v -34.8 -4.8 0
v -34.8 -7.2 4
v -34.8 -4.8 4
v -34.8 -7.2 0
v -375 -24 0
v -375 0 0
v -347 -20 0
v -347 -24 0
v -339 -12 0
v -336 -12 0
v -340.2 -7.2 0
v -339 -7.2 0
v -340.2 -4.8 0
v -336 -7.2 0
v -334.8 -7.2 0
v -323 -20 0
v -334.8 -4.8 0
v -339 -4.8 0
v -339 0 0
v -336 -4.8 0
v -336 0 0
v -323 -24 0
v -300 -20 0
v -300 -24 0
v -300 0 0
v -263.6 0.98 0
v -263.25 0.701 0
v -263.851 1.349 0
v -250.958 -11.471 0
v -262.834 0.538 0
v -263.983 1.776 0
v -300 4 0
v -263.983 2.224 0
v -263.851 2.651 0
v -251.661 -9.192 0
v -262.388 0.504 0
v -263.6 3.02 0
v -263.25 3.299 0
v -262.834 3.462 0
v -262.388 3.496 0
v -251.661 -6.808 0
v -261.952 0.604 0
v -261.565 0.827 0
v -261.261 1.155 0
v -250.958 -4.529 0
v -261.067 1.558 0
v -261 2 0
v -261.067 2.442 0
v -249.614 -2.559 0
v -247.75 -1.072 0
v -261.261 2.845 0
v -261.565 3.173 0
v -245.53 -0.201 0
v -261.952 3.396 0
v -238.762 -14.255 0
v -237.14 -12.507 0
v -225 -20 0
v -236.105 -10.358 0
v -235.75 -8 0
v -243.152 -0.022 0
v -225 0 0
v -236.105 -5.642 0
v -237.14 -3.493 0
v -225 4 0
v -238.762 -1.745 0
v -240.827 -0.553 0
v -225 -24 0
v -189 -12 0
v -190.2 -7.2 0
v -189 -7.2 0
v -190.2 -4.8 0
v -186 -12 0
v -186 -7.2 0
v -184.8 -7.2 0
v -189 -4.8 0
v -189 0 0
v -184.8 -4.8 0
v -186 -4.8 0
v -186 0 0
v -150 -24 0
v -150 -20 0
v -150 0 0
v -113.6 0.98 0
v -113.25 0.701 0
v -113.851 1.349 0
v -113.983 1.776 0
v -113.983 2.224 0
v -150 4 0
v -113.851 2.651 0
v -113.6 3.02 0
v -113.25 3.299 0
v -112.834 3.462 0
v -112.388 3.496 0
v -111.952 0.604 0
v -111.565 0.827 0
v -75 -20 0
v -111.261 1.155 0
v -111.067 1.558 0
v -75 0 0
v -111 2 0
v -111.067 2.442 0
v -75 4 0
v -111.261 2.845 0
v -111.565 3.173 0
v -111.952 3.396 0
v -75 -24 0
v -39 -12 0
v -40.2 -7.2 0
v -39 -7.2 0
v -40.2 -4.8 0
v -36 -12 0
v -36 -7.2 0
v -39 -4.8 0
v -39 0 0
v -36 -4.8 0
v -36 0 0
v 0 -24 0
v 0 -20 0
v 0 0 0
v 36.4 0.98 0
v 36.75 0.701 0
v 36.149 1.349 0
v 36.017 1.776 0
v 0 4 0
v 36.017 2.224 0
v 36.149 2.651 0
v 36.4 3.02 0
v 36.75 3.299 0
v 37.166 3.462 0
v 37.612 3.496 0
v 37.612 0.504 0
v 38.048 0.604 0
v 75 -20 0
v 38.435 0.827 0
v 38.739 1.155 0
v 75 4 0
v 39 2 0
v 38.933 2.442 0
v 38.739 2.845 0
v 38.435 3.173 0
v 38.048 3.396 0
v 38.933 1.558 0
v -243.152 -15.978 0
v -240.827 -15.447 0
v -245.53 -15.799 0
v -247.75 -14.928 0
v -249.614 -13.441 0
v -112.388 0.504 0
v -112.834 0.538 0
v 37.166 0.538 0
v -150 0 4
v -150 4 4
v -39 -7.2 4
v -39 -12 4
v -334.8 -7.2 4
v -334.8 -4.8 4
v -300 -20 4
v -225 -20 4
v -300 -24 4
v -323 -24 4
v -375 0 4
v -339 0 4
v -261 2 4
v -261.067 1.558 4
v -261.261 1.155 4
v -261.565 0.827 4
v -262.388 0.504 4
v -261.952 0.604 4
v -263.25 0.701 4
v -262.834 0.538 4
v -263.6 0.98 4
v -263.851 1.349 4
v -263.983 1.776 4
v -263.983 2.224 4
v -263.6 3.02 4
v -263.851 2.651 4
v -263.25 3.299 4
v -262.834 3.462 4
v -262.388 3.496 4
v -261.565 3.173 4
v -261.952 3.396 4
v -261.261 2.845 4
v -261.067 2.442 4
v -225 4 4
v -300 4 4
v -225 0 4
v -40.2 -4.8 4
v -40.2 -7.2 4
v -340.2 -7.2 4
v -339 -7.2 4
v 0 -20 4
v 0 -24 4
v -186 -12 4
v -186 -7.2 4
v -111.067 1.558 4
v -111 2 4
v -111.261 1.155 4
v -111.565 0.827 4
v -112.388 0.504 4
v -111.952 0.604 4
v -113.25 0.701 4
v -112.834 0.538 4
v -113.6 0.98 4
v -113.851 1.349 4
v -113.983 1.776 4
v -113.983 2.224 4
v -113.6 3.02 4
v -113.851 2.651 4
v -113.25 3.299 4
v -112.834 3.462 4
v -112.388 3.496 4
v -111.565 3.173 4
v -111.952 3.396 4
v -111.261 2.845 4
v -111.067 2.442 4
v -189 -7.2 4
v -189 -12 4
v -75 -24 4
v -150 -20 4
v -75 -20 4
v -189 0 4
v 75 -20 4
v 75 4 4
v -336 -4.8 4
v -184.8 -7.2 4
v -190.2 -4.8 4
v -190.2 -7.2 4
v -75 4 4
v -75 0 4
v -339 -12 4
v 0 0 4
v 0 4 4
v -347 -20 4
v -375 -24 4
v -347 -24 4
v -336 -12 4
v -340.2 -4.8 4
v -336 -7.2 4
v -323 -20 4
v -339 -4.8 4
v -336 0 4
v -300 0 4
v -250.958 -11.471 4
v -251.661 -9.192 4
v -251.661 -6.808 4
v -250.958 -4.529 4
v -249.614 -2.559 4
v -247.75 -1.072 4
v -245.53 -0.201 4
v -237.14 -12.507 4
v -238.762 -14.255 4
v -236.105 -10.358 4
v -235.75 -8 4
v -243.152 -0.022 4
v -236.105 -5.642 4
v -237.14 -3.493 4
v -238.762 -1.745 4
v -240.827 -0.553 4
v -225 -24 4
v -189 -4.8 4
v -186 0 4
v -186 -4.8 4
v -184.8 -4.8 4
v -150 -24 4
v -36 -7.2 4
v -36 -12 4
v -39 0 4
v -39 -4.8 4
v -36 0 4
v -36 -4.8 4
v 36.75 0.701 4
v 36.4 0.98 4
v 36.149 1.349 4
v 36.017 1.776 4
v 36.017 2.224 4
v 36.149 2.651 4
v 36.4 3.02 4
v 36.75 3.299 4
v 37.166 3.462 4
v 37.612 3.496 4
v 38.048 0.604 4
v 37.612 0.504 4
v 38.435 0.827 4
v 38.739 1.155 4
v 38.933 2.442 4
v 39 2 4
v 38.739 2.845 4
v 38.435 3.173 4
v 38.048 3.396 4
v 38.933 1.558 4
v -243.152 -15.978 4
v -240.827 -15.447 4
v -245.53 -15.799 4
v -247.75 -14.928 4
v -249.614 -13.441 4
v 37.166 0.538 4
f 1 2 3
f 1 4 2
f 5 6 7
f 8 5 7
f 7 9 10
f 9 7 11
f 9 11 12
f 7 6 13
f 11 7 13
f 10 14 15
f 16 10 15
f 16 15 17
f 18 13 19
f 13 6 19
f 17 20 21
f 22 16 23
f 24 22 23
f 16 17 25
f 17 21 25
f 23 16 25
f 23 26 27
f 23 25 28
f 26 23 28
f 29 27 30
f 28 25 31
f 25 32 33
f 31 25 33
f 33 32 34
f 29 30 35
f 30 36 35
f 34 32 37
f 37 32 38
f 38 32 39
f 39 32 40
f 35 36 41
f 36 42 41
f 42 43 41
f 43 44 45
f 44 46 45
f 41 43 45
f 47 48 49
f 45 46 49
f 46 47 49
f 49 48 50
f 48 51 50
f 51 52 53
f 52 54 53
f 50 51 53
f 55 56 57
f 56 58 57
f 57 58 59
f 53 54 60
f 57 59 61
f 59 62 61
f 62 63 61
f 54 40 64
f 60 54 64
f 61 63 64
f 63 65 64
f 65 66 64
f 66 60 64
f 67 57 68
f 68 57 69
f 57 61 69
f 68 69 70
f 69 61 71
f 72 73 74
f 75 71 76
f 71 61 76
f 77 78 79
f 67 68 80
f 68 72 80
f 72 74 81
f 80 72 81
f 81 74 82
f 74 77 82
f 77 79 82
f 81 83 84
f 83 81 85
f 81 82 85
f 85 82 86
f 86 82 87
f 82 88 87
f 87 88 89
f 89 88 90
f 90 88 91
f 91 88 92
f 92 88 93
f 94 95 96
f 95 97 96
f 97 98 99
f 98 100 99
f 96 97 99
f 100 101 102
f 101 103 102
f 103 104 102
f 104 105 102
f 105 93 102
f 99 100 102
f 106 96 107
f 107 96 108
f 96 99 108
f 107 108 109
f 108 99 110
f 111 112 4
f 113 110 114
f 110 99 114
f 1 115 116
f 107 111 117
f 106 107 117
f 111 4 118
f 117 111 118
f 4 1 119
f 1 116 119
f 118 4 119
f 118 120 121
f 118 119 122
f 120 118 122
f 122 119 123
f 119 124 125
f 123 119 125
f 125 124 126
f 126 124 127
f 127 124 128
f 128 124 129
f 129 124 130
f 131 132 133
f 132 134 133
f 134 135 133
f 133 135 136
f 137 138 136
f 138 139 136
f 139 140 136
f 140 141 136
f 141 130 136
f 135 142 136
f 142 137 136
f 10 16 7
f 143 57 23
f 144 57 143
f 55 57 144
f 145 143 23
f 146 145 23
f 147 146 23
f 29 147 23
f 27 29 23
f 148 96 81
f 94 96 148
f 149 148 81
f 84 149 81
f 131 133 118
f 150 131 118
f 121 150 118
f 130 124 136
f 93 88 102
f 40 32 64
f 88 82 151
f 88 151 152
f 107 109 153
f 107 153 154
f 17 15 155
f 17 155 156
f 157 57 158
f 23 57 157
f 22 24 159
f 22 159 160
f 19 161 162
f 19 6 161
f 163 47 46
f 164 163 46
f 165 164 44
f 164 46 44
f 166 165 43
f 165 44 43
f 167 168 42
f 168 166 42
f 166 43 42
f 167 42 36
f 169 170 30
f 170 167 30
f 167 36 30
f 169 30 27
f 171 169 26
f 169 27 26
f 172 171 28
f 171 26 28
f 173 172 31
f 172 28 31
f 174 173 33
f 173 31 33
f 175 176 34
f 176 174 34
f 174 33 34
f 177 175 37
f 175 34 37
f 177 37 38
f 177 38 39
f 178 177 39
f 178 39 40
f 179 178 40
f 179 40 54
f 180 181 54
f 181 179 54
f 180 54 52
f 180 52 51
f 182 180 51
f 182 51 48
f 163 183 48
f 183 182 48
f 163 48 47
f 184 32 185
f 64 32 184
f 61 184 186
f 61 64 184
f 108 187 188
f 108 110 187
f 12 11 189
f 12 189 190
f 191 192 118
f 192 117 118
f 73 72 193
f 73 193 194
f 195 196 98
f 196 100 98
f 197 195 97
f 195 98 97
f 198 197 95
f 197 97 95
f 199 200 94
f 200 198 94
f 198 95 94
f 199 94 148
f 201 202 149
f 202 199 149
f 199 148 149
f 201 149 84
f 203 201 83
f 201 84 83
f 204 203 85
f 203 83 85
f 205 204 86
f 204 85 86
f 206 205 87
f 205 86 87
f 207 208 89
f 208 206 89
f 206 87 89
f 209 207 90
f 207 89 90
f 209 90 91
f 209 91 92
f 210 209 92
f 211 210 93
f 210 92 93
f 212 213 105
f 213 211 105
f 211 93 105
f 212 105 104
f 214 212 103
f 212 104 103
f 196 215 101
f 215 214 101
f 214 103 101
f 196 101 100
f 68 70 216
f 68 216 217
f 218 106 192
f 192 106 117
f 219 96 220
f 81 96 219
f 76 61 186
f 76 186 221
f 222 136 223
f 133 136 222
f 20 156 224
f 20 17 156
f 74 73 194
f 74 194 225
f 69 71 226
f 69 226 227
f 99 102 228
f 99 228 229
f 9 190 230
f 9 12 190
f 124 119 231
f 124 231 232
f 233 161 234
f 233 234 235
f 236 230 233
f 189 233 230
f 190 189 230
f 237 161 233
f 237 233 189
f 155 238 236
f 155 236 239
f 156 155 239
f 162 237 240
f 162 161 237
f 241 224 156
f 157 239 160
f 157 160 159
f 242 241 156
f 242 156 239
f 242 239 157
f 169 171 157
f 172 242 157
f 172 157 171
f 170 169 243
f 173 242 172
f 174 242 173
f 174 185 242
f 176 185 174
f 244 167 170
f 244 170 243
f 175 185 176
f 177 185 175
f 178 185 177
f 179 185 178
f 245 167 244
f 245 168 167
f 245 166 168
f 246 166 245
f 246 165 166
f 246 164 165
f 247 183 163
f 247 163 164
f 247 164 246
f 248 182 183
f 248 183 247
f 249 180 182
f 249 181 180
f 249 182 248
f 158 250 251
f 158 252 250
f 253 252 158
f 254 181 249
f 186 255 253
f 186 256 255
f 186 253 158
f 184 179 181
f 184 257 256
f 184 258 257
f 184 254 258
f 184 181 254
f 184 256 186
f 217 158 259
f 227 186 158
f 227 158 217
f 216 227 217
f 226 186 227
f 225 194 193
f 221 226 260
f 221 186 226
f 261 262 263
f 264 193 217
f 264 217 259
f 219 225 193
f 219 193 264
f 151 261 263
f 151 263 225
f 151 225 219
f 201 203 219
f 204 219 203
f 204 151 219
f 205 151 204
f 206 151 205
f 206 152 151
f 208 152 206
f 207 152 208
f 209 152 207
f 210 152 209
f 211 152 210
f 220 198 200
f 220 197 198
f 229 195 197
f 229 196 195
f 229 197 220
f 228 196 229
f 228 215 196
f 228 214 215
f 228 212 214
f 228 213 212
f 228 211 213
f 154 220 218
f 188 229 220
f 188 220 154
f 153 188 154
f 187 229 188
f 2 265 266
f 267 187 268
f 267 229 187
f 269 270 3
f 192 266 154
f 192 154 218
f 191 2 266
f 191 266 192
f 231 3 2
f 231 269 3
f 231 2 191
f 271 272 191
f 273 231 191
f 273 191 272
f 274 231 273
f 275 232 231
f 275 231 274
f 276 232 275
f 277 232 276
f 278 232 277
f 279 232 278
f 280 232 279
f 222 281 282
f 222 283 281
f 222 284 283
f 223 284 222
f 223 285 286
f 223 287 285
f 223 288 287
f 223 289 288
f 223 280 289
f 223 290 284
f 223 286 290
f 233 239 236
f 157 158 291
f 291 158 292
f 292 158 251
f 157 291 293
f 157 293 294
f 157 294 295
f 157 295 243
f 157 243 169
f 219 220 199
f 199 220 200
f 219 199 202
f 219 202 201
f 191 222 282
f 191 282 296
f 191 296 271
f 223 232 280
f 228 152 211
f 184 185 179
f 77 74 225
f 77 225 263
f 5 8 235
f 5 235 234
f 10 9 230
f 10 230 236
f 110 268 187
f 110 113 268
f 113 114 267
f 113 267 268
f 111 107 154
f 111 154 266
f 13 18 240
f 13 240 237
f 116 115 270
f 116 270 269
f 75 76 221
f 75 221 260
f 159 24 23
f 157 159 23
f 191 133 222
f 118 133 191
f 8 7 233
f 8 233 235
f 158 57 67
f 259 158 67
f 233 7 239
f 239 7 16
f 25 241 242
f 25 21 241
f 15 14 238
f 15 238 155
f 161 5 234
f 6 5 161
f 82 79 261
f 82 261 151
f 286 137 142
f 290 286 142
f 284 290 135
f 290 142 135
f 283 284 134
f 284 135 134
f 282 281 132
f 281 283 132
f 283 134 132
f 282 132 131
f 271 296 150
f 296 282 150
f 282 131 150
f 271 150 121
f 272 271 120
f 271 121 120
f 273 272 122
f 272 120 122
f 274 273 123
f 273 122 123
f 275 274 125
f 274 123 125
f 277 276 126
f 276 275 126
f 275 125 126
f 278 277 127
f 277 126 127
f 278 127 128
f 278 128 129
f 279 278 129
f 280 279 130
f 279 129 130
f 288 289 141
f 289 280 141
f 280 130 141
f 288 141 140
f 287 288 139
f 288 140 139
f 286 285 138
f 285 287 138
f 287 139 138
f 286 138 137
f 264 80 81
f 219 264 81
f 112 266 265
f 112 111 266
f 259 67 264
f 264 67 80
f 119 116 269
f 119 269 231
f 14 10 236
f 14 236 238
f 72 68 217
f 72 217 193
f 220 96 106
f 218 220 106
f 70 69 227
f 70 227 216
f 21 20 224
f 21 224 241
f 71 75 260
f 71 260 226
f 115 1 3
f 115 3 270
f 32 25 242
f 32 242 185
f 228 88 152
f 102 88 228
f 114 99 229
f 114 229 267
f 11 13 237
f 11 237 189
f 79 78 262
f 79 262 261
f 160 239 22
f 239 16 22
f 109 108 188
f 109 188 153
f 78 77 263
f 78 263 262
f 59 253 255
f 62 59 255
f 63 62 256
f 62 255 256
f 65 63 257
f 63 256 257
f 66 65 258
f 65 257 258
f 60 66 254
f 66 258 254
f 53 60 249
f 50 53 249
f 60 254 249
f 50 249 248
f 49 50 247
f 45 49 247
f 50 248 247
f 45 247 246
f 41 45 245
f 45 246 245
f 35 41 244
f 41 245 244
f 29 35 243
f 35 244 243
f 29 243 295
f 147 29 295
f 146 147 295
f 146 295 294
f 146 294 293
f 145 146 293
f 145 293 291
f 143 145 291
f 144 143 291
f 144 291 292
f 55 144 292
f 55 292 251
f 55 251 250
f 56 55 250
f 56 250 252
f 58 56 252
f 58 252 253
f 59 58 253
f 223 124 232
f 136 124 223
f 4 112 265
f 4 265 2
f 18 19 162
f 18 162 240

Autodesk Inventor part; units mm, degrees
ref_plane "YZ Plane" through (0, 0, 0) normal (1, 0, 0) x (0, 1, 0)
ref_plane "XZ Plane" through (0, 0, 0) normal (0, 1, 0) x (-1, 0, 0)
ref_plane "XY Plane" through (0, 0, 0) normal (0, 0, 1) x (1, 0, 0)
sketch "Sketch1" plane through (0, 0, 0) normal (0, 0, 1) x (1, 0, 0)
  line L0 (-300, -24) -> (-300, -20) projected
  line L1 (-225, -24) -> (-300, -24) construction
  line L2 (-225, -20) -> (-225, -24) projected
  line L3 (-225, -20) -> (-300, -20) projected
  line L4 (-150, -24) -> (-150, -20) projected
  line L5 (-75, -24) -> (-150, -24) construction
  line L6 (-75, -20) -> (-75, -24) projected
  line L7 (-75, -20) -> (-150, -20) projected
  circle A0 centre (-262.5, 2) radius 1.5 projected
  circle A1 centre (-112.5, 2) radius 1.5 projected
  circle A2 centre (37.5, 2) radius 1.5 projected
  line L8 (-236, -49) -> (-236, -199) construction
  line L9 (-236, -199) -> (11, -199) construction
  line L10 (11, -199) -> (11, -49) construction
  line L11 (11, -49) -> (-236, -49) construction
  circle A3 centre (43, -151.5) radius 1.5 construction
  circle A4 centre (43, -96.5) radius 1.5 construction
  circle A5 centre (-268, -96.5) radius 1.5 construction
  circle A6 centre (-268, -151.5) radius 1.5 construction
  circle A7 centre (-335, -151.5) radius 1.5 construction
  circle A8 centre (-335, -96.5) radius 1.5 construction
  line L12 (-270, -161.5) -> (-270, -196.5) construction
  line L13 (-270, -196.5) -> (-266, -196.5) construction
  line L14 (-266, -196.5) -> (-266, -161.5) construction
  line L15 (-266, -161.5) -> (-270, -161.5) construction
  line L16 (45, -51.5) -> (41, -51.5) construction
  line L17 (41, -51.5) -> (41, -86.5) construction
  line L18 (41, -86.5) -> (45, -86.5) construction
  line L19 (45, -86.5) -> (45, -51.5) construction
  line L20 (45, -141.5) -> (45, -106.5) construction
  line L21 (45, -106.5) -> (41, -106.5) construction
  line L22 (41, -106.5) -> (41, -141.5) construction
  line L23 (41, -141.5) -> (45, -141.5) construction
  line L24 (-337, -161.5) -> (-337, -196.5) construction
  line L25 (-337, -196.5) -> (-333, -196.5) construction
  line L26 (-333, -196.5) -> (-333, -161.5) construction
  line L27 (-333, -161.5) -> (-337, -161.5) construction
  line L28 (-270, -106.5) -> (-270, -141.5) construction
  line L29 (-270, -141.5) -> (-266, -141.5) construction
  line L30 (-266, -141.5) -> (-266, -106.5) construction
  line L31 (-266, -106.5) -> (-270, -106.5) construction
  line L32 (-337, -51.5) -> (-337, -86.5) construction
  line L33 (-337, -86.5) -> (-333, -86.5) construction
  line L34 (-333, -86.5) -> (-333, -51.5) construction
  line L35 (-333, -51.5) -> (-337, -51.5) construction
  line L36 (41, -161.5) -> (41, -196.5) construction
  line L37 (41, -196.5) -> (45, -196.5) construction
  line L38 (45, -196.5) -> (45, -161.5) construction
  line L39 (45, -161.5) -> (41, -161.5) construction
  line L40 (-333, -106.5) -> (-337, -106.5) construction
  line L41 (-337, -106.5) -> (-337, -141.5) construction
  line L42 (-337, -141.5) -> (-333, -141.5) construction
  line L43 (-333, -141.5) -> (-333, -106.5) construction
  line L44 (-266, -51.5) -> (-270, -51.5) construction
  line L45 (-270, -51.5) -> (-270, -86.5) construction
  line L46 (-270, -86.5) -> (-266, -86.5) construction
  line L47 (-266, -86.5) -> (-266, -51.5) construction
  circle A9 centre (-112.5, -226) radius 1.5 construction
  circle A10 centre (-262.5, -226) radius 1.5 construction
  circle A11 centre (-187.5, -22) radius 1.5 construction
  circle A12 centre (-37.5, -22) radius 1.5 construction
  circle A13 centre (-337.5, -22) radius 1.5 construction
  circle A14 centre (37.5, -226) radius 1.5 construction
  line L48 (-375, -36.5) -> (-375, 0) projected
  line L49 (-336, 0) -> (-300, 0) projected
  line L50 (-300, 0) -> (-300, 4) projected
  line L51 (-300, 4) -> (-225, 4) projected
  line L52 (-225, 4) -> (-225, 0) projected
  line L53 (-225, 0) -> (-189, 0) projected
  line L54 (-150, 0) -> (-150, 4) projected
  line L55 (-150, 4) -> (-75, 4) projected
  line L56 (-75, 4) -> (-75, 0) projected
  line L57 (-75, 0) -> (-39, 0) projected
  line L58 (0, 0) -> (0, 4) projected
  line L59 (0, 4) -> (75, 4) projected
  line L60 (75, 4) -> (75, -20) projected
  line L61 (75, -20) -> (0, -20) projected
  line L62 (0, -24) -> (0, -20) projected
  line L63 (75, -24) -> (0, -24) construction
  line L64 (75, -36.5) -> (75, -24) projected
  line L65 (79, -36.5) -> (75, -36.5) projected
  line L66 (79, -71.5) -> (79, -36.5) construction
  line L67 (75, -71.5) -> (79, -71.5) construction
  line L68 (75, -87.5) -> (75, -71.5) construction
  line L69 (70.2, -87.5) -> (75, -87.5) construction
  line L70 (70.2, -86.3) -> (70.2, -87.5) construction
  line L71 (67.8, -86.3) -> (70.2, -86.3) construction
  line L72 (67.8, -87.5) -> (67.8, -86.3) construction
  line L73 (63, -87.5) -> (67.8, -87.5) construction
  line L74 (63, -90.5) -> (63, -87.5) construction
  line L75 (67.8, -90.5) -> (63, -90.5) construction
  line L76 (67.8, -91.7) -> (67.8, -90.5) construction
  line L77 (70.2, -91.7) -> (67.8, -91.7) construction
  line L78 (70.2, -90.5) -> (70.2, -91.7) construction
  line L79 (75, -90.5) -> (70.2, -90.5) construction
  line L80 (75, -106.5) -> (75, -90.5) construction
  line L81 (79, -106.5) -> (75, -106.5) construction
  line L82 (79, -141.5) -> (79, -106.5) construction
  line L83 (75, -141.5) -> (79, -141.5) construction
  line L84 (75, -157.5) -> (75, -141.5) construction
  line L85 (70.2, -157.5) -> (75, -157.5) construction
  line L86 (70.2, -156.3) -> (70.2, -157.5) construction
  line L87 (67.8, -156.3) -> (70.2, -156.3) construction
  line L88 (67.8, -157.5) -> (67.8, -156.3) construction
  line L89 (63, -157.5) -> (67.8, -157.5) construction
  line L90 (63, -160.5) -> (63, -157.5) construction
  line L91 (67.8, -160.5) -> (63, -160.5) construction
  line L92 (67.8, -161.7) -> (67.8, -160.5) construction
  line L93 (70.2, -161.7) -> (67.8, -161.7) construction
  line L94 (70.2, -160.5) -> (70.2, -161.7) construction
  line L95 (75, -160.5) -> (70.2, -160.5) construction
  line L96 (75, -176.5) -> (75, -160.5) construction
  line L97 (79, -176.5) -> (75, -176.5) construction
  line L98 (79, -211.5) -> (79, -176.5) construction
  line L99 (75, -211.5) -> (79, -211.5) construction
  line L100 (75, -228) -> (75, -211.5) construction
  line L101 (0, -228) -> (75, -228) construction
  line L102 (0, -224) -> (0, -228) construction
  line L103 (-36, -224) -> (0, -224) construction
  line L104 (-36, -224) -> (-36, -219.2) construction
  line L105 (-36, -219.2) -> (-34.8, -219.2) construction
  line L106 (-34.8, -219.2) -> (-34.8, -216.8) construction
  line L107 (-34.8, -216.8) -> (-36, -216.8) construction
  line L108 (-36, -216.8) -> (-36, -212) construction
  line L109 (-36, -212) -> (-39, -212) construction
  line L110 (-39, -212) -> (-39, -216.8) construction
  line L111 (-39, -216.8) -> (-40.2, -216.8) construction
  line L112 (-40.2, -216.8) -> (-40.2, -219.2) construction
  line L113 (-40.2, -219.2) -> (-39, -219.2) construction
  line L114 (-39, -219.2) -> (-39, -224) construction
  line L115 (-75, -224) -> (-39, -224) construction
  line L116 (-75, -228) -> (-75, -224) construction
  line L117 (-150, -228) -> (-75, -228) construction
  line L118 (-150, -224) -> (-150, -228) construction
  line L119 (-186, -224) -> (-150, -224) construction
  line L120 (-186, -224) -> (-186, -219.2) construction
  line L121 (-186, -219.2) -> (-184.8, -219.2) construction
  line L122 (-184.8, -219.2) -> (-184.8, -216.8) construction
  line L123 (-184.8, -216.8) -> (-186, -216.8) construction
  line L124 (-186, -216.8) -> (-186, -212) construction
  line L125 (-186, -212) -> (-189, -212) construction
  line L126 (-189, -212) -> (-189, -216.8) construction
  line L127 (-189, -216.8) -> (-190.2, -216.8) construction
  line L128 (-190.2, -216.8) -> (-190.2, -219.2) construction
  line L129 (-190.2, -219.2) -> (-189, -219.2) construction
  line L130 (-189, -219.2) -> (-189, -224) construction
  line L131 (-225, -224) -> (-189, -224) construction
  line L132 (-225, -228) -> (-225, -224) construction
  line L133 (-300, -228) -> (-225, -228) construction
  line L134 (-300, -224) -> (-300, -228) construction
  line L135 (-336, -224) -> (-300, -224) construction
  line L136 (-336, -224) -> (-336, -219.2) construction
  line L137 (-336, -219.2) -> (-334.8, -219.2) construction
  line L138 (-334.8, -219.2) -> (-334.8, -216.8) construction
  line L139 (-334.8, -216.8) -> (-336, -216.8) construction
  line L140 (-336, -216.8) -> (-336, -212) construction
  line L141 (-336, -212) -> (-339, -212) construction
  line L142 (-339, -212) -> (-339, -216.8) construction
  line L143 (-339, -216.8) -> (-340.2, -216.8) construction
  line L144 (-340.2, -216.8) -> (-340.2, -219.2) construction
  line L145 (-340.2, -219.2) -> (-339, -219.2) construction
  line L146 (-339, -219.2) -> (-339, -224) construction
  line L147 (-375, -224) -> (-339, -224) construction
  line L148 (-375, -211.5) -> (-375, -224) construction
  line L149 (-383, -211.5) -> (-375, -211.5) construction
  line L150 (-383, -176.5) -> (-383, -211.5) construction
  line L151 (-375, -176.5) -> (-383, -176.5) construction
  line L152 (-375, -160.5) -> (-375, -176.5) construction
  line L153 (-370.2, -160.5) -> (-375, -160.5) construction
  line L154 (-370.2, -161.7) -> (-370.2, -160.5) construction
  line L155 (-367.8, -161.7) -> (-370.2, -161.7) construction
  line L156 (-367.8, -160.5) -> (-367.8, -161.7) construction
  line L157 (-363, -160.5) -> (-367.8, -160.5) construction
  line L158 (-363, -157.5) -> (-363, -160.5) construction
  line L159 (-367.8, -157.5) -> (-363, -157.5) construction
  line L160 (-367.8, -156.3) -> (-367.8, -157.5) construction
  line L161 (-370.2, -156.3) -> (-367.8, -156.3) construction
  line L162 (-370.2, -157.5) -> (-370.2, -156.3) construction
  line L163 (-375, -157.5) -> (-370.2, -157.5) construction
  line L164 (-375, -141.5) -> (-375, -157.5) construction
  line L165 (-383, -141.5) -> (-375, -141.5) construction
  line L166 (-383, -106.5) -> (-383, -141.5) construction
  line L167 (-375, -106.5) -> (-383, -106.5) construction
  line L168 (-375, -90.5) -> (-375, -106.5) construction
  line L169 (-370.2, -90.5) -> (-375, -90.5) construction
  line L170 (-370.2, -91.7) -> (-370.2, -90.5) construction
  line L171 (-367.8, -91.7) -> (-370.2, -91.7) construction
  line L172 (-367.8, -90.5) -> (-367.8, -91.7) construction
  line L173 (-363, -90.5) -> (-367.8, -90.5) construction
  line L174 (-363, -87.5) -> (-363, -90.5) construction
  line L175 (-367.8, -87.5) -> (-363, -87.5) construction
  line L176 (-367.8, -86.3) -> (-367.8, -87.5) construction
  line L177 (-370.2, -86.3) -> (-367.8, -86.3) construction
  line L178 (-370.2, -87.5) -> (-370.2, -86.3) construction
  line L179 (-375, -87.5) -> (-370.2, -87.5) construction
  line L180 (-375, -71.5) -> (-375, -87.5) construction
  line L181 (-383, -71.5) -> (-375, -71.5) construction
  line L182 (-383, -36.5) -> (-383, -71.5) construction
  line L183 (-375, -36.5) -> (-383, -36.5) projected
  line L184 (-300, -24) -> (-323, -24)
  line L185 (-225, -24) -> (-150, -24)
  line L186 (-75, -24) -> (0, -24)
  line L187 (-337, -86.5) -> (-337, -51.5) projected
  line L188 (-337, -51.5) -> (-333, -51.5) projected
  line L189 (-333, -86.5) -> (-333, -51.5) projected
  line L190 (-337, -86.5) -> (-333, -86.5) projected
  line L191 (-333, -51.5) -> (-337, -51.5) projected
  line L192 (-337, -20) -> (-333, -20) projected
  line L193 (-337, -20) -> (-347, -20)
  line L194 (-347, -20) -> (-347, -24)
  line L195 (-333, -20) -> (-323, -20)
  line L196 (-323, -20) -> (-323, -24)
  line L197 (-347, -24) -> (-375, -24)
  line L198 (-323, -24) -> (-347, -24) construction
  line L199 (-336, -4.8) -> (-336, 0) projected
  line L200 (-189, 0) -> (-189, -4.8) projected
  line L201 (-189, -4.8) -> (-190.2, -4.8) projected
  line L202 (-190.2, -4.8) -> (-190.2, -7.2) projected
  line L203 (-190.2, -7.2) -> (-189, -7.2) projected
  line L204 (-189, -7.2) -> (-189, -12) projected
  line L205 (-189, -12) -> (-186, -12) projected
  line L206 (-186, -12) -> (-186, -7.2) projected
  line L207 (-186, -7.2) -> (-184.8, -7.2) projected
  line L208 (-184.8, -7.2) -> (-184.8, -4.8) projected
  line L209 (-184.8, -4.8) -> (-186, -4.8) projected
  line L210 (-186, -4.8) -> (-186, 0) projected
  line L211 (-186, 0) -> (-150, 0) projected
  line L212 (-39, 0) -> (-39, -4.8) projected
  line L213 (-39, -4.8) -> (-40.2, -4.8) projected
  line L214 (-40.2, -4.8) -> (-40.2, -7.2) projected
  line L215 (-40.2, -7.2) -> (-39, -7.2) projected
  line L216 (-39, -7.2) -> (-39, -12) projected
  line L217 (-39, -12) -> (-36, -12) projected
  line L218 (-36, -12) -> (-36, -7.2) projected
  line L219 (-36, -7.2) -> (-34.8, -7.2) projected
  line L220 (-34.8, -7.2) -> (-34.8, -4.8) projected
  line L221 (-34.8, -4.8) -> (-36, -4.8) projected
  line L222 (-36, -4.8) -> (-36, 0) projected
  line L223 (-36, 0) -> (0, 0) projected
  line L224 (-339, 0) -> (-339, -4.8) projected
  line L225 (-339, -4.8) -> (-340.2, -4.8) projected
  line L226 (-340.2, -4.8) -> (-340.2, -7.2) projected
  line L227 (-340.2, -7.2) -> (-339, -7.2) projected
  line L228 (-339, -7.2) -> (-339, -12) projected
  line L229 (-339, -12) -> (-336, -12) projected
  line L230 (-336, -12) -> (-336, -7.2) projected
  line L231 (-336, -7.2) -> (-334.8, -7.2) projected
  line L232 (-334.8, -7.2) -> (-334.8, -4.8) projected
  line L233 (-334.8, -4.8) -> (-336, -4.8) projected
  line L234 (-264, -14.6161) -> (-264, -20)
  line L235 (-261, -20) -> (-261, -14.6161)
  line L236 (-261, -14.6161) -> (-259.8, -14.6161)
  line L237 (-259.8, -14.6161) -> (-259.8, -12.2161)
  line L238 (-259.8, -12.2161) -> (-261, -12.2161)
  line L239 (-261, -12.2161) -> (-261, -8)
  line L240 (-261, -8) -> (-264, -8)
  line L241 (-264, -8) -> (-264, -12.2161)
  line L242 (-264, -12.2161) -> (-265.2, -12.2161)
  line L243 (-265.2, -12.2161) -> (-265.2, -14.6161)
  line L244 (-265.2, -14.6161) -> (-264, -14.6161)
  line L245 (-115.2, -12.2161) -> (-115.2, -14.6161)
  line L246 (-115.2, -14.6161) -> (-114, -14.6161)
  line L247 (-111, -20) -> (-111, -14.6161)
  line L248 (-114, -12.2161) -> (-115.2, -12.2161)
  line L249 (-114, -8) -> (-114, -12.2161)
  line L250 (-111, -14.6161) -> (-109.8, -14.6161)
  line L251 (-109.8, -14.6161) -> (-109.8, -12.2161)
  line L252 (-109.8, -12.2161) -> (-111, -12.2161)
  line L253 (-111, -8) -> (-114, -8)
  line L254 (-111, -12.2161) -> (-111, -8)
  line L255 (-114, -14.6161) -> (-114, -20)
  line L256 (34.8, -12.2161) -> (34.8, -14.6161)
  line L257 (34.8, -14.6161) -> (36, -14.6161)
  line L258 (39, -20) -> (39, -14.6161)
  line L259 (36, -12.2161) -> (34.8, -12.2161)
  line L260 (36, -8) -> (36, -12.2161)
  line L261 (39, -14.6161) -> (40.2, -14.6161)
  line L262 (40.2, -14.6161) -> (40.2, -12.2161)
  line L263 (40.2, -12.2161) -> (39, -12.2161)
  line L264 (39, -8) -> (36, -8)
  line L265 (39, -12.2161) -> (39, -8)
  line L266 (36, -14.6161) -> (36, -20)
  line L267 (-375, 0) -> (-339, 0) projected
  point P0 (-262.5, -8)
  point P1 (-262.5, -20)
  point P2 (-112.5, -20)
  point P3 (-112.5, -8)
  point P4 (37.5, -20)
  point P5 (37.5, -8)
  dimension "d2" = 10
  dimension "d3" = 10
  dimension "d4" = 3
  dimension "d5" = 5.4
  dimension "d6" = 12
  dimension "d7" = 2.4
  dimension "d10" = 150
extrude "Extrusion1" add sketch "Sketch1" along normal blind 4 contours L184 L196 L195 L192 L193 L194 L197 L48 L267 L224 L225 L226 L227 L228 L229 L230 L231 L232 L233 L199 L49 L50 L51 L52 L53 L200 L201 L202 L203 L204 L205 L206 L207 L208 L209 L210 L211 L54 L55 L56 L57 L212 L213 L214 L215 L216 L217 L218 L219 L220 L221 L222 L223 L58 L59 L60 L61 L258 L261 L262 L263 L265 L264 L260 L259 L256 L257 L266 L62 L186 L6 L7 L247 L250 L251 L252 L254 L253 L249 L248 L245 L246 L255 L4 L185 L2 L3 L235 L236 L237 L238 L239 L240 L241 L242 L243 L244 L234 L0 | L234 L244 L243 L242 L241 L240 L239 L238 L237 L236 L235 L3 | L255 L246 L245 L248 L249 L253 L254 L252 L251 L250 L247 L7 | L266 L257 L256 L259 L260 L264 L265 L263 L262 L261 L258 L61
sketch "Sketch2" plane through (0, 0, 4) normal (0, 0, 1) x (1, 0, 0)
  circle A0 centre (-243.75, -8) radius 8
  line L0 (-225, -20) -> (-225, -24) construction
  line L1 (-225, -24) -> (-150, -24) construction
  line L2 (-150, -24) -> (-150, -20) construction
  line L3 (-150, -20) -> (-75, -20) construction
  line L4 (-75, -20) -> (-75, -24) construction
  line L5 (-75, -24) -> (0, -24) construction
  line L6 (0, -24) -> (0, -20) construction
  line L7 (0, -20) -> (75, -20) construction
  line L8 (75, -20) -> (75, 4) construction
  line L9 (75, 4) -> (0, 4) construction
  line L10 (0, 4) -> (0, 0) construction
  line L11 (0, 0) -> (-36, 0) construction
  line L12 (-36, 0) -> (-36, -4.8) construction
  line L13 (-36, -4.8) -> (-34.8, -4.8) construction
  line L14 (-34.8, -4.8) -> (-34.8, -7.2) construction
  line L15 (-34.8, -7.2) -> (-36, -7.2) construction
  line L16 (-36, -7.2) -> (-36, -12) construction
  line L17 (-36, -12) -> (-39, -12) construction
  line L18 (-39, -12) -> (-39, -7.2) construction
  line L19 (-39, -7.2) -> (-40.2, -7.2) construction
  line L20 (-40.2, -7.2) -> (-40.2, -4.8) construction
  line L21 (-40.2, -4.8) -> (-39, -4.8) construction
  line L22 (-39, -4.8) -> (-39, 0) construction
  line L23 (-39, 0) -> (-75, 0) construction
  line L24 (-75, 0) -> (-75, 4) construction
  line L25 (-75, 4) -> (-150, 4) construction
  line L26 (-150, 4) -> (-150, 0) construction
  line L27 (-150, 0) -> (-186, 0) construction
  line L28 (-186, 0) -> (-186, -4.8) construction
  line L29 (-186, -4.8) -> (-184.8, -4.8) construction
  line L30 (-184.8, -4.8) -> (-184.8, -7.2) construction
  line L31 (-184.8, -7.2) -> (-186, -7.2) construction
  line L32 (-186, -7.2) -> (-186, -12) construction
  line L33 (-186, -12) -> (-189, -12) construction
  line L34 (-189, -12) -> (-189, -7.2) construction
  line L35 (-189, -7.2) -> (-190.2, -7.2) construction
  line L36 (-190.2, -7.2) -> (-190.2, -4.8) construction
  line L37 (-190.2, -4.8) -> (-189, -4.8) construction
  line L38 (-189, -4.8) -> (-189, 0) construction
  line L39 (-189, 0) -> (-225, 0) construction
  line L40 (-225, 0) -> (-225, 4) construction
  line L41 (-225, 4) -> (-300, 4) construction
  line L42 (-300, 4) -> (-300, 0) construction
  line L43 (-300, 0) -> (-336, 0) construction
  line L44 (-336, 0) -> (-336, -4.8) construction
  line L45 (-336, -4.8) -> (-334.8, -4.8) construction
  line L46 (-334.8, -4.8) -> (-334.8, -7.2) construction
  line L47 (-334.8, -7.2) -> (-336, -7.2) construction
  line L48 (-336, -7.2) -> (-336, -12) construction
  line L49 (-336, -12) -> (-339, -12) construction
  line L50 (-339, -12) -> (-339, -7.2) construction
  line L51 (-339, -7.2) -> (-340.2, -7.2) construction
  line L52 (-340.2, -7.2) -> (-340.2, -4.8) construction
  line L53 (-340.2, -4.8) -> (-339, -4.8) construction
  line L54 (-339, -4.8) -> (-339, 0) construction
  line L55 (-339, 0) -> (-375, 0) construction
  line L56 (-375, 0) -> (-375, -24) construction
  line L57 (-375, -24) -> (-347, -24) construction
  line L58 (-347, -24) -> (-347, -20) construction
  line L59 (-347, -20) -> (-323, -20) construction
  line L60 (-323, -20) -> (-323, -24) construction
  line L61 (-323, -24) -> (-300, -24) construction
  line L62 (-300, -24) -> (-300, -20) construction
  line L63 (-300, -20) -> (-225, -20) construction
  circle A1 centre (-262.5, 2) radius 1.5 construction
  circle A2 centre (-112.5, 2) radius 1.5 construction
  circle A3 centre (37.5, 2) radius 1.5 construction
  line L64 (-243.75, -8) -> (-262.5, -8) construction
  line L65 (-243.75, -8) -> (-225, -8) construction
  dimension "d16" = 4
  dimension "d17" = 4
extrude "Extrusion2" cut sketch "Sketch2" against normal up to next
properties part number "Cableduct_Side" material "MDF Medium Density Fiberboard"
